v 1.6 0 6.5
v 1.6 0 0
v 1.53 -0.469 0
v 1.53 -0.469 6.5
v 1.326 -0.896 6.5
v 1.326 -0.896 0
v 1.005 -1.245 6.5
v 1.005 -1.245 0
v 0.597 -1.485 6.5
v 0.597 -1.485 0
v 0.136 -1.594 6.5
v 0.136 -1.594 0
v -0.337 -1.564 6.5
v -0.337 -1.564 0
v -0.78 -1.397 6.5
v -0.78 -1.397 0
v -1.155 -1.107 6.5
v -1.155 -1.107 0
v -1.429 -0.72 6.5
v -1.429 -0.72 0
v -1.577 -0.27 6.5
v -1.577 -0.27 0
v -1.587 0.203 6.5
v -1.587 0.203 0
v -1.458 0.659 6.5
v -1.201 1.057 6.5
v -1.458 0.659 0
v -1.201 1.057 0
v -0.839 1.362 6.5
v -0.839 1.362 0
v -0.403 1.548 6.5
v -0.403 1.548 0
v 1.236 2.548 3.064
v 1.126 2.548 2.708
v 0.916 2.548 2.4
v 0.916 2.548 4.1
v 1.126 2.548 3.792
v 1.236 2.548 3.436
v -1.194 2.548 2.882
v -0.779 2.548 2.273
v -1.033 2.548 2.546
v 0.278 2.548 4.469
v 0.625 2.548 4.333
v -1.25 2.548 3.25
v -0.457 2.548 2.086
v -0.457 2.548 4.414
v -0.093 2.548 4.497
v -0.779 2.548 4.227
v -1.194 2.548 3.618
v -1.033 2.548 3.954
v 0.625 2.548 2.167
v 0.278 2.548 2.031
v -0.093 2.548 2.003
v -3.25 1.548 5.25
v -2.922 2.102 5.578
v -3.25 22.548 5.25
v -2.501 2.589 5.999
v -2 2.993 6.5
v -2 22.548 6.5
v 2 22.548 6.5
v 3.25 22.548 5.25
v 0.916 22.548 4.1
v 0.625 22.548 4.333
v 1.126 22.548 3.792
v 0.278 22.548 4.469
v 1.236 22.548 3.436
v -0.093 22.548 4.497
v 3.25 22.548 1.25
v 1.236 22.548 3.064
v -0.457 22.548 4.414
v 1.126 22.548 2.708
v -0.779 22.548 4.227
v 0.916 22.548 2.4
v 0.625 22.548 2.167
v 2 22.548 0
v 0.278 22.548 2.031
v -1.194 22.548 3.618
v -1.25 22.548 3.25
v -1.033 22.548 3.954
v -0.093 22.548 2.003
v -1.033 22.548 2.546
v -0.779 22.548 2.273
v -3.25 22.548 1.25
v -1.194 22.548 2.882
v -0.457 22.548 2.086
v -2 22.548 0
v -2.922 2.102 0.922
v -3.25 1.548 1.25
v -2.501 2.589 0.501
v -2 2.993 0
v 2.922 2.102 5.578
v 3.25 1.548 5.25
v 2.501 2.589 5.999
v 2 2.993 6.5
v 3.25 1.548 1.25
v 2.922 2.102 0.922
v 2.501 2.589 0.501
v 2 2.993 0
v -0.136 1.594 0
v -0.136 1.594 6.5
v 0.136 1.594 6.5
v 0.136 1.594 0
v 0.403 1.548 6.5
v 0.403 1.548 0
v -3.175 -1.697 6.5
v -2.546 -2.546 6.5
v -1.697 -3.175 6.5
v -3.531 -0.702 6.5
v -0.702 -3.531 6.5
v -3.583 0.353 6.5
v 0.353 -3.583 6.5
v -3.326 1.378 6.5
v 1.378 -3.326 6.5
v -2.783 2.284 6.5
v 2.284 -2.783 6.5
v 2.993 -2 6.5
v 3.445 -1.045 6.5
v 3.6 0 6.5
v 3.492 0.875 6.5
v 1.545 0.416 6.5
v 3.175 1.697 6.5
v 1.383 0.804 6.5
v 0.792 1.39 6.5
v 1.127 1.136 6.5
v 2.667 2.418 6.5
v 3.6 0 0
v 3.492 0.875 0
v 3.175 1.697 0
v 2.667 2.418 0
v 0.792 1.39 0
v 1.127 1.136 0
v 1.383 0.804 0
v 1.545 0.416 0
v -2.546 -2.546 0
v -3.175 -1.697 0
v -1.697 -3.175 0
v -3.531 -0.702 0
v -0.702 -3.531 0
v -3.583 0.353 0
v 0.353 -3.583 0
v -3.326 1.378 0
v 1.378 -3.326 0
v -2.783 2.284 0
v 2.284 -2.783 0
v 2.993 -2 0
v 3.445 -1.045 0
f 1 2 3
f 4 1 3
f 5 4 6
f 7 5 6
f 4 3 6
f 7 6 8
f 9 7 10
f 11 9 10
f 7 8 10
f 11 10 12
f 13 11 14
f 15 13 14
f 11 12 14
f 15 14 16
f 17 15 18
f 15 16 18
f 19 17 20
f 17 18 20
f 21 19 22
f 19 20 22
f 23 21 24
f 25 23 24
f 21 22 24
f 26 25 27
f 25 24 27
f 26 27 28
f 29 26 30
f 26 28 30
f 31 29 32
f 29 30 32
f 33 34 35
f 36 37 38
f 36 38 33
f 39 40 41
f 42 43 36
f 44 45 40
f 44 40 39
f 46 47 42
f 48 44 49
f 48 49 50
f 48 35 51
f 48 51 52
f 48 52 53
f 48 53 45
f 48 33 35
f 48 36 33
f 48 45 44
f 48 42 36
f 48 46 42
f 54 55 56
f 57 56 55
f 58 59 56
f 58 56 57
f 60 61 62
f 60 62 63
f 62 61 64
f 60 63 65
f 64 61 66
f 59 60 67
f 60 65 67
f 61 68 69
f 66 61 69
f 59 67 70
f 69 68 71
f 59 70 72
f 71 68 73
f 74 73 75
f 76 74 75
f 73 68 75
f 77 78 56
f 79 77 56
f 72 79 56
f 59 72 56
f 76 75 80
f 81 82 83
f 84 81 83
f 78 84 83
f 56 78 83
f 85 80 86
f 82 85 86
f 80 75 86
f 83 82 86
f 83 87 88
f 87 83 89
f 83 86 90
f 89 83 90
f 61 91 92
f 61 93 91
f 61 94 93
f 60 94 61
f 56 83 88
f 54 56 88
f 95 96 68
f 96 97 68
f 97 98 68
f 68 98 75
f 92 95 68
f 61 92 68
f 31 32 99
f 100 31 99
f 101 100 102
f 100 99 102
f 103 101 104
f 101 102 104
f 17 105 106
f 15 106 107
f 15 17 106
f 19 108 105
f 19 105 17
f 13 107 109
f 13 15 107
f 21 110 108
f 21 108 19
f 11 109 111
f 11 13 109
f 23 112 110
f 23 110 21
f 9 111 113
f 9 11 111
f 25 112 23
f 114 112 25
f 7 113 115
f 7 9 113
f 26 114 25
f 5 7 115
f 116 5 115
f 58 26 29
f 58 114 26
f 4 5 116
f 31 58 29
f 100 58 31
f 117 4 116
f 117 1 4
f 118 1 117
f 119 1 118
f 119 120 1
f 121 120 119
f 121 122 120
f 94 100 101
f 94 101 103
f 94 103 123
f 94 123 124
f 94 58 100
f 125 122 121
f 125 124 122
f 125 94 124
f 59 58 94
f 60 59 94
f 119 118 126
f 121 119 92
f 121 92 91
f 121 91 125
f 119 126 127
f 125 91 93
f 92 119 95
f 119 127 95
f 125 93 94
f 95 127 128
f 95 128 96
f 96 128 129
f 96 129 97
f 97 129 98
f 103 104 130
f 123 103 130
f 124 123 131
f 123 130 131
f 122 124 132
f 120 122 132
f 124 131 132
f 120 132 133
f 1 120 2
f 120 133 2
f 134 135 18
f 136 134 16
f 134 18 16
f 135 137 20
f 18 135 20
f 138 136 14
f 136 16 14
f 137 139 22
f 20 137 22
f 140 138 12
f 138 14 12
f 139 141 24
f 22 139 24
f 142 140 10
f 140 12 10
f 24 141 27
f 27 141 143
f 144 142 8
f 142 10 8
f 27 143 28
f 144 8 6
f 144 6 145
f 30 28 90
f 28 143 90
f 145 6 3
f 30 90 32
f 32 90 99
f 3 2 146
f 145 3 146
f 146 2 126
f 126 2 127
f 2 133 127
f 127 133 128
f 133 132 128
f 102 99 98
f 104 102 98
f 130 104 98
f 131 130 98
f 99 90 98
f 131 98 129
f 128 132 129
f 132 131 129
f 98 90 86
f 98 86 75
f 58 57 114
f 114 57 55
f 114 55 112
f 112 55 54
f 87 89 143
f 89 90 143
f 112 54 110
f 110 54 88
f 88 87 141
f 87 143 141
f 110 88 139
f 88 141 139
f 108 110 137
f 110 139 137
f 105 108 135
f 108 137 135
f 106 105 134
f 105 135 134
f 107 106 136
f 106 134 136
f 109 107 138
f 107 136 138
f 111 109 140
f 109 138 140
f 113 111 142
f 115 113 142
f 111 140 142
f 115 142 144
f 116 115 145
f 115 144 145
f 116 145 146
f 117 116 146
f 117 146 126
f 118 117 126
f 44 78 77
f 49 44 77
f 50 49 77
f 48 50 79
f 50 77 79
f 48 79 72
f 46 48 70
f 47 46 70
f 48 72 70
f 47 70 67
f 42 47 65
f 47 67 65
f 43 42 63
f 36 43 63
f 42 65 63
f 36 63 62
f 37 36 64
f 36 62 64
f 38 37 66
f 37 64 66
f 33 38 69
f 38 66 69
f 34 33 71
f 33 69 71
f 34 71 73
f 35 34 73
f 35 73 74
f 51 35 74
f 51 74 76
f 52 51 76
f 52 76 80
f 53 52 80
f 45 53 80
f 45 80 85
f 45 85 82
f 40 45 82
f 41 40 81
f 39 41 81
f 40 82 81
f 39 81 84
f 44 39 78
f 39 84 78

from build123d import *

# Parameters (mm, degrees)
F3_DEPTH = 6.5
F4_SIZE  = 1.25
F5_R     = 1.25
F6_DEPTH = 20


with BuildPart() as f3:
    # F2 (on Top) → F3 (new body)
    with BuildSketch(Plane.XY):
        with BuildLine():
            ThreePointArc((-3.25, 1.5483862567), (0, 3.6), (3.25, 1.5483862567))
            Line((3.25, 1.5483862567), (3.25, 22.5483862567))
            Line((3.25, 22.5483862567), (-3.25, 22.5483862567))
            Line((-3.25, 22.5483862567), (-3.25, 1.5483862567))
        make_face()
        with BuildLine():
            ThreePointArc((-0.4031128874, 1.5483862567), (0, 1.6), (0.4031128874, 1.5483862567))
            Line((0.4031128874, 1.5483862567), (3.25, 1.5483862567))
            ThreePointArc((3.25, 1.5483862567), (0, 3.6), (-3.25, 1.5483862567))
            Line((-3.25, 1.5483862567), (-0.4031128874, 1.5483862567))
        make_face()
        with BuildLine():
            ThreePointArc((0.4031128874, 1.5483862567), (1.2658950628, 0.9785242409), (1.6, 0))
            ThreePointArc((1.6, 0), (-0.9785242409, -1.2658950628), (-0.4031128874, 1.5483862567))
            Line((-0.4031128874, 1.5483862567), (-3.25, 1.5483862567))
            ThreePointArc((-3.25, 1.5483862567), (-0.7937253933, -3.5114099732), (3.6, 0))
            ThreePointArc((3.6, 0), (3.5114099732, 0.7937253933), (3.25, 1.5483862567))
            Line((3.25, 1.5483862567), (0.4031128874, 1.5483862567))
        make_face()
    extrude(amount=F3_DEPTH)

    # F4
    f4_edges = [f3.edges().sort_by_distance(p)[0] for p in [
        (3.25, 12.048386, 6.5),
        (-3.25, 12.048386, 6.5),
        (3.25, 12.048386, 0),
        (-3.25, 12.048386, 0),
    ]]
    chamfer(f4_edges, length=F4_SIZE)

    # F5 (on face) → F6 (cut)
    with BuildSketch(Plane(origin=(0, 22.5483862567, 0), x_dir=(-1, 0, 0), z_dir=(0, 1, 0))):
        with Locations((0, 3.25)):
            Circle(F5_R)
    extrude(amount=-F6_DEPTH, mode=Mode.SUBTRACT)


solid = f3.part
